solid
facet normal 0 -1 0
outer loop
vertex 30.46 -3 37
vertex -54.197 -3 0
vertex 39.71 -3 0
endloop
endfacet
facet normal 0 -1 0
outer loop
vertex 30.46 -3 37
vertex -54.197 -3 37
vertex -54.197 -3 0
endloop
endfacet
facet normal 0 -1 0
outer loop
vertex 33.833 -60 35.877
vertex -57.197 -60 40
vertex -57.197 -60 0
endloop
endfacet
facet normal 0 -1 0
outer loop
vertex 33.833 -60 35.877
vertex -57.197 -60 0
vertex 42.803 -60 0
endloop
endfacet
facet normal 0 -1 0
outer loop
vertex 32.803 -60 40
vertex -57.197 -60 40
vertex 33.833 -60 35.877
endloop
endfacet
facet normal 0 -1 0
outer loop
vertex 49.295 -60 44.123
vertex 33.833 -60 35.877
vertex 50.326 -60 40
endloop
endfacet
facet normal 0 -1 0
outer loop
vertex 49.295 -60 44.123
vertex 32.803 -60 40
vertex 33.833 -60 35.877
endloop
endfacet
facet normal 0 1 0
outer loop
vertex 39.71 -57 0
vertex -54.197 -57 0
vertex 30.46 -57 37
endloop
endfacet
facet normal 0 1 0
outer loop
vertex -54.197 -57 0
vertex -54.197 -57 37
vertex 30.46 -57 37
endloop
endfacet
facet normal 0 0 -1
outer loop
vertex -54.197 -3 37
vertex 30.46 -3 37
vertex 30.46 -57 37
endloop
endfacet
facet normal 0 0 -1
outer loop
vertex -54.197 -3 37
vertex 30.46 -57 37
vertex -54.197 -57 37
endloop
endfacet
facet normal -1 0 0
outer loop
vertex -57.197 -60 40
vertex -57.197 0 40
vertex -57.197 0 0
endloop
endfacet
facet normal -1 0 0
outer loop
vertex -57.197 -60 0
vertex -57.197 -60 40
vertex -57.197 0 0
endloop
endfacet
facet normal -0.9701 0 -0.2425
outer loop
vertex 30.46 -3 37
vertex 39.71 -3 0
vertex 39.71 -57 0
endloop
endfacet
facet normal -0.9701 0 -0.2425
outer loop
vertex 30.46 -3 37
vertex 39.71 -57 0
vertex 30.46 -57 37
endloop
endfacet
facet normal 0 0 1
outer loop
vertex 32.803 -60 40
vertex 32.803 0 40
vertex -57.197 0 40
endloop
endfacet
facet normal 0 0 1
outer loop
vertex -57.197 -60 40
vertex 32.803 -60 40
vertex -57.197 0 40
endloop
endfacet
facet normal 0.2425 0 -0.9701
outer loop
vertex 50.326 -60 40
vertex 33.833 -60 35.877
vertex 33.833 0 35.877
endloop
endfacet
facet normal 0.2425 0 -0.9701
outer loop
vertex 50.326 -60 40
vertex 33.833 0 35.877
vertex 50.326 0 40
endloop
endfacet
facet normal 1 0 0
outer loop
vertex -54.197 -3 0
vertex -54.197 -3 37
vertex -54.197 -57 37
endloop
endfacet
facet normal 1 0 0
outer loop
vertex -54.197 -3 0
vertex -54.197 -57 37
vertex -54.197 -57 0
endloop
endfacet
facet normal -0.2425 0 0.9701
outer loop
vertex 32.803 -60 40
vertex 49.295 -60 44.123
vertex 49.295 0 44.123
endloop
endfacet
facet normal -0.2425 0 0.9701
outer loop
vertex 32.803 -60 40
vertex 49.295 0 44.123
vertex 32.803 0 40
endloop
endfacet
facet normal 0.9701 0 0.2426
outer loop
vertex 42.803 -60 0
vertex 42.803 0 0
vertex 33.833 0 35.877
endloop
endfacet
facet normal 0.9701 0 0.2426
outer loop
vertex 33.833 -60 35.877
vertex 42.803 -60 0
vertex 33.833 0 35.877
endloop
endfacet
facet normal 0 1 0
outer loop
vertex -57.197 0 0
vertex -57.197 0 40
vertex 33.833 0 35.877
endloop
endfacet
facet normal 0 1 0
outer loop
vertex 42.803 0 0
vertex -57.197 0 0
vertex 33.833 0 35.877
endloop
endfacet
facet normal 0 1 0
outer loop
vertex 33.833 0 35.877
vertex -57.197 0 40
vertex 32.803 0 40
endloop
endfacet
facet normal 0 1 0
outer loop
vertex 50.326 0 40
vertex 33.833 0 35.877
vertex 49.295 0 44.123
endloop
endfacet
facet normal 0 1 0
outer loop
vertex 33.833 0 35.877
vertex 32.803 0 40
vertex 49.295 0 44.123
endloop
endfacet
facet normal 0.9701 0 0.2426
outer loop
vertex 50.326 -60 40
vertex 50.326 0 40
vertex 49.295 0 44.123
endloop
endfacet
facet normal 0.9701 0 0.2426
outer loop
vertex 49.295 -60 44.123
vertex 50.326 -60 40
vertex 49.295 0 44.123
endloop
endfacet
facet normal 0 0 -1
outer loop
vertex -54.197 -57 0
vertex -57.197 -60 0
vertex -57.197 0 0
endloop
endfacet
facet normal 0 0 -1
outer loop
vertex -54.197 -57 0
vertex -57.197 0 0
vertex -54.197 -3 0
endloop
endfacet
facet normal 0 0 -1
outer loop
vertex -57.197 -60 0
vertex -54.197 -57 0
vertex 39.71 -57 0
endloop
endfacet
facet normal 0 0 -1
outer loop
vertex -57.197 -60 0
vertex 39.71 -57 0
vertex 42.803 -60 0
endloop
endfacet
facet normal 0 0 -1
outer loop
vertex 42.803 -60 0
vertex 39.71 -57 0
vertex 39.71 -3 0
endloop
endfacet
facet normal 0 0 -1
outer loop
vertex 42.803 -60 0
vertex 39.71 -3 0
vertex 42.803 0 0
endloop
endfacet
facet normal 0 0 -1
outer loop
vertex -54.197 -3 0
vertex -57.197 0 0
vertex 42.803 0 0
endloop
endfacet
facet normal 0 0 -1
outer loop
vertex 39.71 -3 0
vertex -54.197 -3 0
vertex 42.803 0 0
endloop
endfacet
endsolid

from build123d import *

# Parameters (mm, degrees)
F1_DEPTH = 60
F2_DEPTH = 60
F3_T     = -3


with BuildPart() as f1:
    # F0 (on Front) → F1 (new body)
    with BuildSketch(Plane.XZ):
        Polygon((-57.1974544724, 40), (-57.1974544724, 0), (42.8025455276, 0), (33.833321934, 35.8768943744), (32.8025455276, 40), align=None)
    extrude(amount=F1_DEPTH)

    # F0 (on Front) → F2 (join)
    with BuildSketch(Plane.XZ):
        Polygon((32.8025455276, 40), (33.833321934, 35.8768943744), (50.3257444365, 40), (49.2949680301, 44.1231056256), align=None)
    extrude(amount=F2_DEPTH)

    # F3
    f3_openings = [f1.faces().sort_by_distance(p)[0] for p in [
        (-7.197454, -30, 0),
    ]]
    offset(amount=F3_T, openings=f3_openings, kind=Kind.INTERSECTION)


solid = f1.part
